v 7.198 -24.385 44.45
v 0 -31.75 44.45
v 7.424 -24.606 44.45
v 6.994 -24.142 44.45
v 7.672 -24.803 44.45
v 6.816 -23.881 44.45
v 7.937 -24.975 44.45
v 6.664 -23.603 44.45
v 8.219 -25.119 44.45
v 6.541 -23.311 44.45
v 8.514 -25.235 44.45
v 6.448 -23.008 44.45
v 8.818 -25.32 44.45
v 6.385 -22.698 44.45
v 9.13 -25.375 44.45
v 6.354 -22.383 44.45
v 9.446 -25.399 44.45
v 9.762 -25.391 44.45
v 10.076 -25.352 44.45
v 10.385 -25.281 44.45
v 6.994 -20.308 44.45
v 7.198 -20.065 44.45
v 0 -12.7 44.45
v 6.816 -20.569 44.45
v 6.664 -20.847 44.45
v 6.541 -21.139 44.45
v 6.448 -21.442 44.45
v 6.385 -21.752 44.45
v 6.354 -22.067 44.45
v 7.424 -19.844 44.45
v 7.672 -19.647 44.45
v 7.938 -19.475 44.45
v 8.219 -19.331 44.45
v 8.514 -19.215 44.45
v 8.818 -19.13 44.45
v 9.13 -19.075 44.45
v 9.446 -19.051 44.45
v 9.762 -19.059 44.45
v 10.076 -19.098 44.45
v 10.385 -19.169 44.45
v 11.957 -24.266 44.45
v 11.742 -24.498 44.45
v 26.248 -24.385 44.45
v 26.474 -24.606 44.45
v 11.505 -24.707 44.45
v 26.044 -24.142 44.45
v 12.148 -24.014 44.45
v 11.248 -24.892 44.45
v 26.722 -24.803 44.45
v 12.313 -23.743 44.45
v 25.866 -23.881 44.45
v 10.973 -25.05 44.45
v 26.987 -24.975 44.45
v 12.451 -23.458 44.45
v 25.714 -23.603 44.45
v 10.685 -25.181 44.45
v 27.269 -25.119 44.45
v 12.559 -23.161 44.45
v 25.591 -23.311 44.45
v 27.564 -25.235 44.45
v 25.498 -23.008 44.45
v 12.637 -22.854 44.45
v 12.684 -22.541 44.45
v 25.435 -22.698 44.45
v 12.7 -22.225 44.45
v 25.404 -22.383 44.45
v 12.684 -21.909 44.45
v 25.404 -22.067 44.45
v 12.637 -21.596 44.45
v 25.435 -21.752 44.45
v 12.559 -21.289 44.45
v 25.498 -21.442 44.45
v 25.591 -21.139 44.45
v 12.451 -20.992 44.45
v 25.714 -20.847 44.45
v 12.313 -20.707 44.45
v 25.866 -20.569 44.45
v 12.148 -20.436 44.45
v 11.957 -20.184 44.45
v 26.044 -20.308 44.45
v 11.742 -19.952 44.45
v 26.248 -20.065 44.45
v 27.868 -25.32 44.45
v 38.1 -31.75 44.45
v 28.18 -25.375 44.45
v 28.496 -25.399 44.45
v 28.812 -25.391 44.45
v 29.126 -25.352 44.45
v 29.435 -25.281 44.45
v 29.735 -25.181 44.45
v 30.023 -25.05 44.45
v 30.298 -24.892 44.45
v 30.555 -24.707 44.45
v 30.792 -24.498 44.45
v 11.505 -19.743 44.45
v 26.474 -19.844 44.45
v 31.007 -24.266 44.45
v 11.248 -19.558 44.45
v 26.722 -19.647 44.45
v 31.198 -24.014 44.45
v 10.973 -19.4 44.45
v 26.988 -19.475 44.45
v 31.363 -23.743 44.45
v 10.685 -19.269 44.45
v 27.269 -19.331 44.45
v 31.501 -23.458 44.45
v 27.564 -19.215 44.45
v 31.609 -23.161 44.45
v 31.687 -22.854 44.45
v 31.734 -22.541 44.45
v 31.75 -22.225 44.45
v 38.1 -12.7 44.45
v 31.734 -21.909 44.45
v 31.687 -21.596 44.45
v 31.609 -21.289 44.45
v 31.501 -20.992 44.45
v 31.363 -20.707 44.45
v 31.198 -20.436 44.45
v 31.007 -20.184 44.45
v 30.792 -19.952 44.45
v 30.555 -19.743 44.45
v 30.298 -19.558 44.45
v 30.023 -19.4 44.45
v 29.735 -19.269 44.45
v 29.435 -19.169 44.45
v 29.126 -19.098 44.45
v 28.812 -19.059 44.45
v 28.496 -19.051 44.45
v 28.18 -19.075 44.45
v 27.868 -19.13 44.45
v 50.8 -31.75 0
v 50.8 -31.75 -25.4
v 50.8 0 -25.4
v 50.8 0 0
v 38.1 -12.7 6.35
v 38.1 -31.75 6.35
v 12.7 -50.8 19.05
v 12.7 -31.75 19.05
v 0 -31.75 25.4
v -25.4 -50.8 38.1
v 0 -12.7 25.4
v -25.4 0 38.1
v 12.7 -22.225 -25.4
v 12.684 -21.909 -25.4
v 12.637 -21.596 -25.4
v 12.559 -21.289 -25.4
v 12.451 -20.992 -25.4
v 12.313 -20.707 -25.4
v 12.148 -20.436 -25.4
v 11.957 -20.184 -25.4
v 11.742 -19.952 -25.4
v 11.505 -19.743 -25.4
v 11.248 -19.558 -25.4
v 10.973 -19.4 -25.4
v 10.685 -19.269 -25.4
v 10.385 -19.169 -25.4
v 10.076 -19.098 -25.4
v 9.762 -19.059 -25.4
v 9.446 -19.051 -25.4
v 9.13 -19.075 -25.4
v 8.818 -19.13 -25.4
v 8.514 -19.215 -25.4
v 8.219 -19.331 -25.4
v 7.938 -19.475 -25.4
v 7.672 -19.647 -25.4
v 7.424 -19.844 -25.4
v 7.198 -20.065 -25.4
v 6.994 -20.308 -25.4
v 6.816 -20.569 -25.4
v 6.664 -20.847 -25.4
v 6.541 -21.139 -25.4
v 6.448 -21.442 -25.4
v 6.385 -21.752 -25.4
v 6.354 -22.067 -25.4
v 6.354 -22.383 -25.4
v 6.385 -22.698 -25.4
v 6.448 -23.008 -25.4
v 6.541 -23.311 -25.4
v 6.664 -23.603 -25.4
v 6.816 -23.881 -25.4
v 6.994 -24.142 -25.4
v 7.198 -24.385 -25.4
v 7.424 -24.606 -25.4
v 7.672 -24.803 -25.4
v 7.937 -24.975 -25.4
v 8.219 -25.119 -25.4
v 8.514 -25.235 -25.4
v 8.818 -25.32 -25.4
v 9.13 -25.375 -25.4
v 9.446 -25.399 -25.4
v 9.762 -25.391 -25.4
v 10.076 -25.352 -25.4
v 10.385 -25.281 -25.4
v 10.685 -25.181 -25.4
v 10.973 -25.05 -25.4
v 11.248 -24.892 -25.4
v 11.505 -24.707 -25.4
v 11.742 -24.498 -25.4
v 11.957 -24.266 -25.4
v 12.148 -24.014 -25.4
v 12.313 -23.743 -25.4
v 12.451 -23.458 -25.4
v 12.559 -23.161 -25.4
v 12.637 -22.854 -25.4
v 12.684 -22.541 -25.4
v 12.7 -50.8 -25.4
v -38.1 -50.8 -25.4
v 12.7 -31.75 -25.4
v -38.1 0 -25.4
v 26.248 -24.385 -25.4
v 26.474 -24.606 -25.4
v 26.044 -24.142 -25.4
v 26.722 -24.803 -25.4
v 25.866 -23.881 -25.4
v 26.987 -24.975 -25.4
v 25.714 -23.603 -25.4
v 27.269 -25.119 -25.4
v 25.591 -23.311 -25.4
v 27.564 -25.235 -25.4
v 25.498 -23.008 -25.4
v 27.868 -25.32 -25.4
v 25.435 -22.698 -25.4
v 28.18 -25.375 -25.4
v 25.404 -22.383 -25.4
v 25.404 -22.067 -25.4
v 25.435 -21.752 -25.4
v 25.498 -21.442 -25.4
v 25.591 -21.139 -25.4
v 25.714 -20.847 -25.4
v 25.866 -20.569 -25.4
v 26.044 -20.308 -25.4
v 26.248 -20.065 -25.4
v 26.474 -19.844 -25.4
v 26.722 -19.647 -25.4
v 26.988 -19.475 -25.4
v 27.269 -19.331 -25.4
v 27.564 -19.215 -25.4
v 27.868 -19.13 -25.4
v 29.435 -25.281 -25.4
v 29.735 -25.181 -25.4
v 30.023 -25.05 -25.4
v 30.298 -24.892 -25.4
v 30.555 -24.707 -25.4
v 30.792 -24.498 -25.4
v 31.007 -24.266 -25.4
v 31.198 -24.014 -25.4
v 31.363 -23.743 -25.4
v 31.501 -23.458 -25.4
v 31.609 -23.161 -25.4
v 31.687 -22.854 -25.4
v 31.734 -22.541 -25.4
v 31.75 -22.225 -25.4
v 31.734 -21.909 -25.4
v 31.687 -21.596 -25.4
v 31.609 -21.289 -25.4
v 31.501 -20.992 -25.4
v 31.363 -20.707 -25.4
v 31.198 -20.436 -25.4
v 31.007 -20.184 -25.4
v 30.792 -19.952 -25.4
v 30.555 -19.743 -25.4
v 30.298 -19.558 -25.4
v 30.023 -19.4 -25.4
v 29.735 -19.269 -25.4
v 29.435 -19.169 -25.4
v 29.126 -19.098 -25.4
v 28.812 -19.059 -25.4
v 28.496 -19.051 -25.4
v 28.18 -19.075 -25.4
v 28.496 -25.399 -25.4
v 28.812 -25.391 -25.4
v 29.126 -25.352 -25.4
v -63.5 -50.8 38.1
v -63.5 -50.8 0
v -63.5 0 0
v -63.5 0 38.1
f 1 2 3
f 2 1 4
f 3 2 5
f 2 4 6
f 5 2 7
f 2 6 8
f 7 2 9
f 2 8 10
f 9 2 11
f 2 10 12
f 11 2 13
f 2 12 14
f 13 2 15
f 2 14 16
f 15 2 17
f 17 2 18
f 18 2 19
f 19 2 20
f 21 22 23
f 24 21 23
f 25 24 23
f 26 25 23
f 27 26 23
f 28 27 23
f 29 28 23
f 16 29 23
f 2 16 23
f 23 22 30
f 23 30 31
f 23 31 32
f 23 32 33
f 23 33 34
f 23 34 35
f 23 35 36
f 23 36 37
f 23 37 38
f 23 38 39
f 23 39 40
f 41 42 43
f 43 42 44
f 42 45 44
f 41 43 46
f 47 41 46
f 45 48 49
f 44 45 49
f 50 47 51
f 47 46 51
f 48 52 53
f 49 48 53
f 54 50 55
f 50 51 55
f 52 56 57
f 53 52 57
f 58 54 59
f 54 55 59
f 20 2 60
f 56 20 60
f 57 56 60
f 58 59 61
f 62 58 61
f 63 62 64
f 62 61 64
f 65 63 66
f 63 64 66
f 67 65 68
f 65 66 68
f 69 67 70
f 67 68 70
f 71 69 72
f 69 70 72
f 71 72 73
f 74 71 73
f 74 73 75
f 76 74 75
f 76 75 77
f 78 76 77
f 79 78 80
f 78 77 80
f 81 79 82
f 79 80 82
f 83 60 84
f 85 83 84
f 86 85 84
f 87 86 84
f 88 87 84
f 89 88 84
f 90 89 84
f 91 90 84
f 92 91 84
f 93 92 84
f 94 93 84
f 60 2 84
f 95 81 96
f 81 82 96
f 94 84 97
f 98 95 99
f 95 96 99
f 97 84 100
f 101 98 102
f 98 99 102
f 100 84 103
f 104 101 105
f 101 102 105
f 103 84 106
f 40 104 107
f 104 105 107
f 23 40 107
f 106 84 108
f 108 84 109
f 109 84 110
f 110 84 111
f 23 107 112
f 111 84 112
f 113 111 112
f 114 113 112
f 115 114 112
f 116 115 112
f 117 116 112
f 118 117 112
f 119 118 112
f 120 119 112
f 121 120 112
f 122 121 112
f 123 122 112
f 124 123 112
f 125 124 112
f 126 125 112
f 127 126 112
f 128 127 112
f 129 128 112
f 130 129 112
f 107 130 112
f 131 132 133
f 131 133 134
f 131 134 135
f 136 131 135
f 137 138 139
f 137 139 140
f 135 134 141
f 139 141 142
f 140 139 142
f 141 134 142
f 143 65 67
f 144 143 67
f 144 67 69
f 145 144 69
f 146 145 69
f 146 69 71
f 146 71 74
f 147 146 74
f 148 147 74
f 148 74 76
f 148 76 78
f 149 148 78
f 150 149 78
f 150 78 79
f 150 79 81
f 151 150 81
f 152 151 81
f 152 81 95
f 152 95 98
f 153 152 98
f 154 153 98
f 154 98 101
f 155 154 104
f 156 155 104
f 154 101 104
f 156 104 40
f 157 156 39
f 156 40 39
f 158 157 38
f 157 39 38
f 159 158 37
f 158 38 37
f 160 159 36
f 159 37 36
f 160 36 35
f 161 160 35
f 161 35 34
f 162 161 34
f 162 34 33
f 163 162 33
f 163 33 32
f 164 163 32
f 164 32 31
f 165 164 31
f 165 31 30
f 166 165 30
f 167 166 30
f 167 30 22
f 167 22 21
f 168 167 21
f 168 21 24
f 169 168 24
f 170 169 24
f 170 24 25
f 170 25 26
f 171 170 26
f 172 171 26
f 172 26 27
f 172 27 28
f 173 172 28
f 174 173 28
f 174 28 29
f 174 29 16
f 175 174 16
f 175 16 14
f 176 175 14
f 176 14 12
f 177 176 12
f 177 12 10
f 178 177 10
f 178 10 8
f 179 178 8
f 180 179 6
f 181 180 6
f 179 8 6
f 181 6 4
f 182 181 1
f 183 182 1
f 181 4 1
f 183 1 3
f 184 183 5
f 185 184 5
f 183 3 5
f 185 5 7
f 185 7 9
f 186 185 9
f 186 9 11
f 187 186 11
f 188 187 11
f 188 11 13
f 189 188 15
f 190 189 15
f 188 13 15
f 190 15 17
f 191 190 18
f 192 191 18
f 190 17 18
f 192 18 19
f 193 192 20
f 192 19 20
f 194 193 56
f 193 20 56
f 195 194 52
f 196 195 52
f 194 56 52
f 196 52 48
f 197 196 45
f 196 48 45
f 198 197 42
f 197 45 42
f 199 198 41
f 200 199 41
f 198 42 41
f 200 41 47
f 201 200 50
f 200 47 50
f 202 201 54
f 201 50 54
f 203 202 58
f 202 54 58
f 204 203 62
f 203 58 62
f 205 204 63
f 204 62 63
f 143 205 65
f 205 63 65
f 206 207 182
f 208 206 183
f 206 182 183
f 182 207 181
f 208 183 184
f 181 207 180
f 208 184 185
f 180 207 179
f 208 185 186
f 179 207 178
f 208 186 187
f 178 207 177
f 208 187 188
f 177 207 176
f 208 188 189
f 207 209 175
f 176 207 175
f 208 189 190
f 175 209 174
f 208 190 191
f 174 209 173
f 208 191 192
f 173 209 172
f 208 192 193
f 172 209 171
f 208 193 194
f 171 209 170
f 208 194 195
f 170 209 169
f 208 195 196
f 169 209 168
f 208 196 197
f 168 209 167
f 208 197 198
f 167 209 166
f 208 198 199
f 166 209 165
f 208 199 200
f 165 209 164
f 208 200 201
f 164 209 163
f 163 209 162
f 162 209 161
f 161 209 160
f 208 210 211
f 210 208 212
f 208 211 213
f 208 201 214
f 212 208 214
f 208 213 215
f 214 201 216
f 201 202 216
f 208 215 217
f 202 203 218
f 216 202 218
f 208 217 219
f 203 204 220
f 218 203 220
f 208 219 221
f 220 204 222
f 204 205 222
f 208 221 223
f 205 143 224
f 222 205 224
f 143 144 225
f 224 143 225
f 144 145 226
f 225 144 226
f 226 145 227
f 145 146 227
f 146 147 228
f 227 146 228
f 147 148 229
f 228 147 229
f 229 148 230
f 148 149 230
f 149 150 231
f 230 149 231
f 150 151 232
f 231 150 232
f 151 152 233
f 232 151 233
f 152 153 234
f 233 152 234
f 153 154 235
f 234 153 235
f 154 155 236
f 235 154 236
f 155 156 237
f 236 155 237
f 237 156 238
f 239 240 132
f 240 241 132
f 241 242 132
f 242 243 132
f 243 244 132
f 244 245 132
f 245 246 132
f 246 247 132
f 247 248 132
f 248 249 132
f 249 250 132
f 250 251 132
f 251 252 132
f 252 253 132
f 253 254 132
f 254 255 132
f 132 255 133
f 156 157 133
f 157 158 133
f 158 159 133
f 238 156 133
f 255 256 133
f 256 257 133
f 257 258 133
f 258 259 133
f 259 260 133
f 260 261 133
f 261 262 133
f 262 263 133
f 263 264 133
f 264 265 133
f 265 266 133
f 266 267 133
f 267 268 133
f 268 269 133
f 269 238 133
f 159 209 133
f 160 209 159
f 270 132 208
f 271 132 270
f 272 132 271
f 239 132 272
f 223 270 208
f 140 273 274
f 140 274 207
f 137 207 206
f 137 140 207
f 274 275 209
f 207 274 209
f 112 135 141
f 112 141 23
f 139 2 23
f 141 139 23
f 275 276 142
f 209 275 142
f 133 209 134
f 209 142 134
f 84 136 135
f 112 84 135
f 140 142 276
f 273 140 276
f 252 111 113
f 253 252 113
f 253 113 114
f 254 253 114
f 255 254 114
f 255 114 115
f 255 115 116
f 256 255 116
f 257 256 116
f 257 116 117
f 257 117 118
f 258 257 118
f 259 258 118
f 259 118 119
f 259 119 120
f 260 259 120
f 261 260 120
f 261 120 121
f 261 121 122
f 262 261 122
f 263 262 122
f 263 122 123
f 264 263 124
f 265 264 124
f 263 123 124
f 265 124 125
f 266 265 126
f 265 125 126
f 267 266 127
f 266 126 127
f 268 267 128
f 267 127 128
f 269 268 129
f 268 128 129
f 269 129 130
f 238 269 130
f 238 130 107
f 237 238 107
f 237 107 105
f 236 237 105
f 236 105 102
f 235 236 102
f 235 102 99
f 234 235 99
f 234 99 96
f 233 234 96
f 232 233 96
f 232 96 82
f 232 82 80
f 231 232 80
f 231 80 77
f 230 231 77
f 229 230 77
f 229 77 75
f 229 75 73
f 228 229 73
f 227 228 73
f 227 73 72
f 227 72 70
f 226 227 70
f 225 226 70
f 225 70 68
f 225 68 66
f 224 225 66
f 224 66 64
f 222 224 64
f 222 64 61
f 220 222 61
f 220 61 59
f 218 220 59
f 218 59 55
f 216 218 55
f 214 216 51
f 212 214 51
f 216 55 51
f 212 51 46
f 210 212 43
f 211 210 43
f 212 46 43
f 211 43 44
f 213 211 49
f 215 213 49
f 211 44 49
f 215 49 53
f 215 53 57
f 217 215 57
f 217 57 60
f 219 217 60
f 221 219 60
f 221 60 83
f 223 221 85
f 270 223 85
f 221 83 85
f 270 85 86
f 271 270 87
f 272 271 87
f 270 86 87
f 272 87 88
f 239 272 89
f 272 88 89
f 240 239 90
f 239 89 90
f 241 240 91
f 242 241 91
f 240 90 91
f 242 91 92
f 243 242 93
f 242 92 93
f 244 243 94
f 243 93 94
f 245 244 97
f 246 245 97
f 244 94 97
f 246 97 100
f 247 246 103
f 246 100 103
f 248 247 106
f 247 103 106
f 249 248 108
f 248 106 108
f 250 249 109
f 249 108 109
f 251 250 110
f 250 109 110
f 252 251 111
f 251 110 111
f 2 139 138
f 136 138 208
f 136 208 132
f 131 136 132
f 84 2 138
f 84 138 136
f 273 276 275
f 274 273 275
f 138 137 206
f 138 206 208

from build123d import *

# Parameters (mm, degrees)
F1_DEPTH = 50.8
F2_W     = 38.1
F2_H     = 19.05
F3_DEPTH = 63.501
F5_W     = 19.05
F5_H     = 38.1
F6_DEPTH = 38.1
F7_R     = 3.175
F8_DEPTH = 69.851


with BuildPart() as f1:
    # F0 (on Front) → F1 (new body)
    with BuildSketch(Plane.XZ):
        Polygon((-25.4, 38.1), (-63.5, 38.1), (-63.5, 0), (-38.1, -25.4), (50.8, -25.4), (50.8, 0), align=None)
    extrude(amount=F1_DEPTH)

    # F2 (on face) → F3 (cut, through all)
    with BuildSketch(Plane.XY.offset(38.1)):
        with Locations((31.75, -41.275)):
            Rectangle(F2_W, F2_H)
    extrude(amount=-F3_DEPTH, mode=Mode.SUBTRACT)

    # F5 (on offset) → F6 (join)
    with BuildSketch(Plane.YZ.offset(38.1)):
        with Locations((-22.225, 25.4)):
            Rectangle(F5_W, F5_H)
    extrude(amount=-F6_DEPTH)

    # F7 (on face) → F8 (cut, through all)
    with BuildSketch(Plane.XY.offset(44.45)):
        with Locations((9.525, -22.225)):
            Circle(F7_R)
        with Locations((28.575, -22.225)):
            Circle(F7_R)
    extrude(amount=-F8_DEPTH, mode=Mode.SUBTRACT)


solid = f1.part
